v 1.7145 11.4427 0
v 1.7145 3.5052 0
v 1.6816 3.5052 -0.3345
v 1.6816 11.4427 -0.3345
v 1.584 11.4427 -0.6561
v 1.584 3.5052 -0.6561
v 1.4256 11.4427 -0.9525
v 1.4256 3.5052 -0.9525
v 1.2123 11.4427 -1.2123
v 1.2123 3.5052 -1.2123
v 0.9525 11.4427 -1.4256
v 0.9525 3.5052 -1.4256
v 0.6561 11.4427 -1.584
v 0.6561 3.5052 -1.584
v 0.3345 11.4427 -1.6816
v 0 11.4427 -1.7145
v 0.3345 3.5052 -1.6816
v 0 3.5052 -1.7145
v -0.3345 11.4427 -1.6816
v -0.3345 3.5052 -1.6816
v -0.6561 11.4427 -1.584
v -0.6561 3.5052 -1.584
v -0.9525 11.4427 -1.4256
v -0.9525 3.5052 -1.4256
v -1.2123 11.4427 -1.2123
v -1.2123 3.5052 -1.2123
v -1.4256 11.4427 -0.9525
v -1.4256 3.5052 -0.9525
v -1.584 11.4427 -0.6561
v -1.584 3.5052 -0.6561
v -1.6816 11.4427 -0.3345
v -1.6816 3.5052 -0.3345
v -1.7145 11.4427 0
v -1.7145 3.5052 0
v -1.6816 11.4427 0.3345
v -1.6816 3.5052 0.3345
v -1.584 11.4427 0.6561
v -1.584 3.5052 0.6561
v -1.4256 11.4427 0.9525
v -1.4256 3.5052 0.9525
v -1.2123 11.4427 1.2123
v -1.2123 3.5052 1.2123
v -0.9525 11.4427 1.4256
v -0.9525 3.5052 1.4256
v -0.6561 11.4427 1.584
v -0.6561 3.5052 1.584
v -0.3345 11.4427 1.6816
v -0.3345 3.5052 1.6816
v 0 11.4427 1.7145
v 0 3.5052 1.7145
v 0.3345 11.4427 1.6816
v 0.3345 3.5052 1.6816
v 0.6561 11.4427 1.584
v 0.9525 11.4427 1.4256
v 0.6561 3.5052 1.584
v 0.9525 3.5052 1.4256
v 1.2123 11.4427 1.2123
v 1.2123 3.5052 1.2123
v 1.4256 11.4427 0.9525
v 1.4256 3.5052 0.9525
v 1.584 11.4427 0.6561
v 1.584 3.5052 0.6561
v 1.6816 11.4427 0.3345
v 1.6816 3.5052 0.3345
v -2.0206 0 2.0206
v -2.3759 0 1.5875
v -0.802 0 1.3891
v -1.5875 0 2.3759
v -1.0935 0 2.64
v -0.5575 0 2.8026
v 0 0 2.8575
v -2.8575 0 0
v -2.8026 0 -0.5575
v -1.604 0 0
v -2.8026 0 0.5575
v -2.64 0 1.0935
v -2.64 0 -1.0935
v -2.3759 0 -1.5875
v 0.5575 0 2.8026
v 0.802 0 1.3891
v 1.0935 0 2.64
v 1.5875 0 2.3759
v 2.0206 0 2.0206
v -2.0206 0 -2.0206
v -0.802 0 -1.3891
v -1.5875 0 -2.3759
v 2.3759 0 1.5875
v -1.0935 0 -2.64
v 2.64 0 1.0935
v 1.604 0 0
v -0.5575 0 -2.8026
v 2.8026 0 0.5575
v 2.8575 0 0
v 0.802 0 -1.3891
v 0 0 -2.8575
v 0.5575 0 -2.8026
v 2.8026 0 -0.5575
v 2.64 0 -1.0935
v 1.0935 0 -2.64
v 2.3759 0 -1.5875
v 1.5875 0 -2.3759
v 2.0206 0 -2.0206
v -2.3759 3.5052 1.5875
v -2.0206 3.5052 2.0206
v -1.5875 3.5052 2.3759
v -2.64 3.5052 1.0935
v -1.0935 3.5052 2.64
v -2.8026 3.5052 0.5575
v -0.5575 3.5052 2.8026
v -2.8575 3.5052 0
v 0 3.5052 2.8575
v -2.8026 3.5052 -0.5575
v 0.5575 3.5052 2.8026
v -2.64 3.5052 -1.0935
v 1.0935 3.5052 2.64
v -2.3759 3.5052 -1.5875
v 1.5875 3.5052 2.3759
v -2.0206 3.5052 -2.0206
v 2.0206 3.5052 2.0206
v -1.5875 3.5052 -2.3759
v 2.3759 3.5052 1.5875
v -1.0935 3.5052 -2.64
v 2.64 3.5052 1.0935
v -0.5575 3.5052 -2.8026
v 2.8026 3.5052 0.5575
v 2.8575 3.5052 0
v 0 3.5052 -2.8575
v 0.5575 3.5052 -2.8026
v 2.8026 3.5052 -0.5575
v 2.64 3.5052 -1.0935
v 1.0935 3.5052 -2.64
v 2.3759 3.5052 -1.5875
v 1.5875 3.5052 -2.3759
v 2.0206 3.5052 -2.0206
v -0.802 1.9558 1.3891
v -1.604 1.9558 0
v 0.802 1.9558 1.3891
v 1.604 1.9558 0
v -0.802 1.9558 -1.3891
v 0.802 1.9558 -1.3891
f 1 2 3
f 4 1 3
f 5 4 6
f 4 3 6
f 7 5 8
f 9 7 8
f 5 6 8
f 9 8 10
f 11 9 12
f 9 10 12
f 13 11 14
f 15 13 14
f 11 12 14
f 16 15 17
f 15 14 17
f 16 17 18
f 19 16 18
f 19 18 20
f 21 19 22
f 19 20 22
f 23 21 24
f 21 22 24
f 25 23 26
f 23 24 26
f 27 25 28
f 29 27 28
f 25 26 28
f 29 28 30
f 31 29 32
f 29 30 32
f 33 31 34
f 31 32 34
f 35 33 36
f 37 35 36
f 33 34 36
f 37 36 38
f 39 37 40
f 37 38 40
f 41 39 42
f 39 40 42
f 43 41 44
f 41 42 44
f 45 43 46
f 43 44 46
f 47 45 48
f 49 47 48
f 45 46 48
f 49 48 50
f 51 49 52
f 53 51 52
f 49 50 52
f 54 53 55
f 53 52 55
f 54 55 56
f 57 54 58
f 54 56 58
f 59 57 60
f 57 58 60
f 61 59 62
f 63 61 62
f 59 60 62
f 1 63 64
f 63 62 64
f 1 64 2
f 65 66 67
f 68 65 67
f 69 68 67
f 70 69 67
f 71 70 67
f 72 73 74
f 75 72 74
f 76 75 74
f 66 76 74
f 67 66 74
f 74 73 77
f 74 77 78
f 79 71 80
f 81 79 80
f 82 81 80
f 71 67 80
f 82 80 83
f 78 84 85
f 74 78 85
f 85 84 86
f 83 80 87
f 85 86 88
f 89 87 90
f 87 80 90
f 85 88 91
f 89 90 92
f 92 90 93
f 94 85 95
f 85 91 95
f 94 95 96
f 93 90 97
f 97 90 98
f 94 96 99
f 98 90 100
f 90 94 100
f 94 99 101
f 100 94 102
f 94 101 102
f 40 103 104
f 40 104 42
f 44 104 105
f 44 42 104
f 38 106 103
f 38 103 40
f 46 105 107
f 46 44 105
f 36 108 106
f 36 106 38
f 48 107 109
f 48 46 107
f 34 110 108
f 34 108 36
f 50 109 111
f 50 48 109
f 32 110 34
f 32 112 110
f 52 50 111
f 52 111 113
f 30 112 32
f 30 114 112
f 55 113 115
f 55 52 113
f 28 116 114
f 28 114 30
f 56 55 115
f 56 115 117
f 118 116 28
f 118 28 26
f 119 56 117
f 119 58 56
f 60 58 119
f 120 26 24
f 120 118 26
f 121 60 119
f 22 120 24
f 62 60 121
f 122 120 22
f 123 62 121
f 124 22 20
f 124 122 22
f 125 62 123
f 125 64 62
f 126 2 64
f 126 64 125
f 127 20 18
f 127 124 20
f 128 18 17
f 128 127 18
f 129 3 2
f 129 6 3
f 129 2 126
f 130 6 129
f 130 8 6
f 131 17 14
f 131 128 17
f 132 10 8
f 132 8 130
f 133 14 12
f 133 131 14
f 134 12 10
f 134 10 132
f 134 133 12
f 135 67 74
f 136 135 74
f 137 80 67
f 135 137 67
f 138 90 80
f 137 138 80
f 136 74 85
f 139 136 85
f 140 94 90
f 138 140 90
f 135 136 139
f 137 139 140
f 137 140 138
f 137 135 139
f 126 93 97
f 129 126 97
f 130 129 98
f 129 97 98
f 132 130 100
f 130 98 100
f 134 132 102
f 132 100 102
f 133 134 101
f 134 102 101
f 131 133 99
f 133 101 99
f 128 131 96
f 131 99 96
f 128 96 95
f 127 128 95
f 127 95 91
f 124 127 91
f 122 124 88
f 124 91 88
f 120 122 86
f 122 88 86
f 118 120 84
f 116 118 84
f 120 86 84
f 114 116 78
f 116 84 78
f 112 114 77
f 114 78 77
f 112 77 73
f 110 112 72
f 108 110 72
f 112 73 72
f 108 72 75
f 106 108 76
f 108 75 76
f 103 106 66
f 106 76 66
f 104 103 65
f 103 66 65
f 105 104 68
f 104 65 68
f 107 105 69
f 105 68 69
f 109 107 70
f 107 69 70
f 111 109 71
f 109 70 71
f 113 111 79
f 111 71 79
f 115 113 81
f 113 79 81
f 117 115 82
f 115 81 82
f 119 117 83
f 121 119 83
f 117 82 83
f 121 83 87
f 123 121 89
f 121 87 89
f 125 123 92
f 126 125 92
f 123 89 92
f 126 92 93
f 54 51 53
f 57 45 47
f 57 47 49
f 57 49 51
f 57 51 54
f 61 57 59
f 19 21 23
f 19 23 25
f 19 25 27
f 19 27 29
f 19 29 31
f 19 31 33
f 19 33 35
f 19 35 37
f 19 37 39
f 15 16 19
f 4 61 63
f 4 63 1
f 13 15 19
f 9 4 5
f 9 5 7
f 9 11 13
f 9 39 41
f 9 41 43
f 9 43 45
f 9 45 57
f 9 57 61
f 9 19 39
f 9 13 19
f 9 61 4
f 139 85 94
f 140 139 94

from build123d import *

# Parameters (mm, degrees)
SKETCH1_R           = 2.8575
BOSS_EXTRUDE1_DEPTH = 3.5052
CUT_EXTRUDE1_DEPTH  = 1.9558
SKETCH3_R           = 1.7145
BOSS_EXTRUDE2_DEPTH = 7.9375


with BuildPart() as part:
    # Sketch1 → Boss-Extrude1 (new body)
    with BuildSketch(Plane(origin=(0, 0, 0), x_dir=(1, 0, 0), z_dir=(0, 1, 0))):
        Circle(SKETCH1_R)
    extrude(amount=BOSS_EXTRUDE1_DEPTH)

    # Sketch2 → Cut-Extrude1 (cut)
    with BuildSketch(Plane.XZ):
        Polygon((1.603951217, 0), (0.801975608, 1.3890625), (-0.801975608, 1.3890625), (-1.603951217, 0), (-0.801975608, -1.3890625), (0.801975608, -1.3890625), align=None)
    extrude(amount=-CUT_EXTRUDE1_DEPTH, mode=Mode.SUBTRACT)

    # Sketch3 → Boss-Extrude2 (add)
    with BuildSketch(Plane(origin=(0, 3.5052, 0), x_dir=(1, 0, 0), z_dir=(0, 1, 0))):
        Circle(SKETCH3_R)
    extrude(amount=BOSS_EXTRUDE2_DEPTH)


solid = part.part
